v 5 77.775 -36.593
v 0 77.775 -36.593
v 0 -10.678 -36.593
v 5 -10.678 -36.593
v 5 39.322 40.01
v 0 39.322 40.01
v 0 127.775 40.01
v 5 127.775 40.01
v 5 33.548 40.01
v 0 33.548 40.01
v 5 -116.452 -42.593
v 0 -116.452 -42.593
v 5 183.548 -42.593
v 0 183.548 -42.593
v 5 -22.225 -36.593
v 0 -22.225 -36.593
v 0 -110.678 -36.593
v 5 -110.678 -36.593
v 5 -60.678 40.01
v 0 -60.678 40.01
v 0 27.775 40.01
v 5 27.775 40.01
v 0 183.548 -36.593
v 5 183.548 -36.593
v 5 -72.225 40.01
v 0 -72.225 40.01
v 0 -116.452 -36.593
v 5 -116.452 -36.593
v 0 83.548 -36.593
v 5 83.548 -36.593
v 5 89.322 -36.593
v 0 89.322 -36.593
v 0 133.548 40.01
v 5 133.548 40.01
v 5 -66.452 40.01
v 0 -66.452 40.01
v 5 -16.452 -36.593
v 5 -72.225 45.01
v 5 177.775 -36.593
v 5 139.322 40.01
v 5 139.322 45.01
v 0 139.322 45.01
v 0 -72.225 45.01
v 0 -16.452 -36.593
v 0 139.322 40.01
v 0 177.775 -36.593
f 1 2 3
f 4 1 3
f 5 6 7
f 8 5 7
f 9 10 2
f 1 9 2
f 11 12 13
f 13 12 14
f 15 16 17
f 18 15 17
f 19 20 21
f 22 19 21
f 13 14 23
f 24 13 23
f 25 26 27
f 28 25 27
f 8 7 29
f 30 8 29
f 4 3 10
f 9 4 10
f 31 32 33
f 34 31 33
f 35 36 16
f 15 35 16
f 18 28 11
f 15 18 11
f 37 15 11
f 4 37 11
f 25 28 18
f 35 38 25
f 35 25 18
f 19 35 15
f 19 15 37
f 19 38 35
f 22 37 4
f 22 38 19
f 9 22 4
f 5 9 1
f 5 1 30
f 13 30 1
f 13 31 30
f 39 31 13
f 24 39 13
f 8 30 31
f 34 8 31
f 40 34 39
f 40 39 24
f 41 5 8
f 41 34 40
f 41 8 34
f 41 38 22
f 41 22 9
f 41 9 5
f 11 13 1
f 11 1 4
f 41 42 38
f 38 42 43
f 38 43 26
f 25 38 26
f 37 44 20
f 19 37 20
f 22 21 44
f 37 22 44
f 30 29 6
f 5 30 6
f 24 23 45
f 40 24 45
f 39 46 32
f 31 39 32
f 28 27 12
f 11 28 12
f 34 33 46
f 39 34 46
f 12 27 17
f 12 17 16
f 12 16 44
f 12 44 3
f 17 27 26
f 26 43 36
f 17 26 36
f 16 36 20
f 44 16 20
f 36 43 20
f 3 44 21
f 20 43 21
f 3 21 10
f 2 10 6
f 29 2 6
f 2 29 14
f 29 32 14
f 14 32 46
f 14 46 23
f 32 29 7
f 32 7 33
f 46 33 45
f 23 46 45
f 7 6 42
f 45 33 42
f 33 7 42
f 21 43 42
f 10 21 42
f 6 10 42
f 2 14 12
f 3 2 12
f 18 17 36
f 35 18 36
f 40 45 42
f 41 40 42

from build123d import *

# Parameters (mm, degrees)
F1_DEPTH = 5


with BuildPart() as f1:
    # F0 (on Right) → F1 (new body)
    with BuildSketch(Plane.YZ):
        Polygon((133.548133, 40.009566), (139.321636, 40.009566), (139.321636, 45.009566), (-72.22537, 45.009566), (-72.22537, 40.009566), (-66.451867, 40.009566), (-60.678364, 40.009566), (27.77463, 40.009566), (33.548133, 40.009566), (39.321636, 40.009566), (127.77463, 40.009566), align=None)
        Polygon((-72.22537, 40.009566), (-116.451867, -36.592975), (-110.678364, -36.592975), (-66.451867, 40.009566), align=None)
        Polygon((-66.451867, 40.009566), (-22.22537, -36.592975), (-16.451867, -36.592975), (-60.678364, 40.009566), align=None)
        Polygon((-116.451867, -42.592975), (183.548133, -42.592975), (183.548133, -36.592975), (177.77463, -36.592975), (89.321636, -36.592975), (83.548133, -36.592975), (77.77463, -36.592975), (-10.678364, -36.592975), (-16.451867, -36.592975), (-22.22537, -36.592975), (-110.678364, -36.592975), (-116.451867, -36.592975), align=None)
        Polygon((27.77463, 40.009566), (-16.451867, -36.592975), (-10.678364, -36.592975), (33.548133, 40.009566), align=None)
        Polygon((77.77463, -36.592975), (83.548133, -36.592975), (39.321636, 40.009566), (33.548133, 40.009566), align=None)
        Polygon((83.548133, -36.592975), (89.321636, -36.592975), (133.548133, 40.009566), (127.77463, 40.009566), align=None)
        Polygon((177.77463, -36.592975), (183.548133, -36.592975), (139.321636, 40.009566), (133.548133, 40.009566), align=None)
    extrude(amount=F1_DEPTH)


solid = f1.part
